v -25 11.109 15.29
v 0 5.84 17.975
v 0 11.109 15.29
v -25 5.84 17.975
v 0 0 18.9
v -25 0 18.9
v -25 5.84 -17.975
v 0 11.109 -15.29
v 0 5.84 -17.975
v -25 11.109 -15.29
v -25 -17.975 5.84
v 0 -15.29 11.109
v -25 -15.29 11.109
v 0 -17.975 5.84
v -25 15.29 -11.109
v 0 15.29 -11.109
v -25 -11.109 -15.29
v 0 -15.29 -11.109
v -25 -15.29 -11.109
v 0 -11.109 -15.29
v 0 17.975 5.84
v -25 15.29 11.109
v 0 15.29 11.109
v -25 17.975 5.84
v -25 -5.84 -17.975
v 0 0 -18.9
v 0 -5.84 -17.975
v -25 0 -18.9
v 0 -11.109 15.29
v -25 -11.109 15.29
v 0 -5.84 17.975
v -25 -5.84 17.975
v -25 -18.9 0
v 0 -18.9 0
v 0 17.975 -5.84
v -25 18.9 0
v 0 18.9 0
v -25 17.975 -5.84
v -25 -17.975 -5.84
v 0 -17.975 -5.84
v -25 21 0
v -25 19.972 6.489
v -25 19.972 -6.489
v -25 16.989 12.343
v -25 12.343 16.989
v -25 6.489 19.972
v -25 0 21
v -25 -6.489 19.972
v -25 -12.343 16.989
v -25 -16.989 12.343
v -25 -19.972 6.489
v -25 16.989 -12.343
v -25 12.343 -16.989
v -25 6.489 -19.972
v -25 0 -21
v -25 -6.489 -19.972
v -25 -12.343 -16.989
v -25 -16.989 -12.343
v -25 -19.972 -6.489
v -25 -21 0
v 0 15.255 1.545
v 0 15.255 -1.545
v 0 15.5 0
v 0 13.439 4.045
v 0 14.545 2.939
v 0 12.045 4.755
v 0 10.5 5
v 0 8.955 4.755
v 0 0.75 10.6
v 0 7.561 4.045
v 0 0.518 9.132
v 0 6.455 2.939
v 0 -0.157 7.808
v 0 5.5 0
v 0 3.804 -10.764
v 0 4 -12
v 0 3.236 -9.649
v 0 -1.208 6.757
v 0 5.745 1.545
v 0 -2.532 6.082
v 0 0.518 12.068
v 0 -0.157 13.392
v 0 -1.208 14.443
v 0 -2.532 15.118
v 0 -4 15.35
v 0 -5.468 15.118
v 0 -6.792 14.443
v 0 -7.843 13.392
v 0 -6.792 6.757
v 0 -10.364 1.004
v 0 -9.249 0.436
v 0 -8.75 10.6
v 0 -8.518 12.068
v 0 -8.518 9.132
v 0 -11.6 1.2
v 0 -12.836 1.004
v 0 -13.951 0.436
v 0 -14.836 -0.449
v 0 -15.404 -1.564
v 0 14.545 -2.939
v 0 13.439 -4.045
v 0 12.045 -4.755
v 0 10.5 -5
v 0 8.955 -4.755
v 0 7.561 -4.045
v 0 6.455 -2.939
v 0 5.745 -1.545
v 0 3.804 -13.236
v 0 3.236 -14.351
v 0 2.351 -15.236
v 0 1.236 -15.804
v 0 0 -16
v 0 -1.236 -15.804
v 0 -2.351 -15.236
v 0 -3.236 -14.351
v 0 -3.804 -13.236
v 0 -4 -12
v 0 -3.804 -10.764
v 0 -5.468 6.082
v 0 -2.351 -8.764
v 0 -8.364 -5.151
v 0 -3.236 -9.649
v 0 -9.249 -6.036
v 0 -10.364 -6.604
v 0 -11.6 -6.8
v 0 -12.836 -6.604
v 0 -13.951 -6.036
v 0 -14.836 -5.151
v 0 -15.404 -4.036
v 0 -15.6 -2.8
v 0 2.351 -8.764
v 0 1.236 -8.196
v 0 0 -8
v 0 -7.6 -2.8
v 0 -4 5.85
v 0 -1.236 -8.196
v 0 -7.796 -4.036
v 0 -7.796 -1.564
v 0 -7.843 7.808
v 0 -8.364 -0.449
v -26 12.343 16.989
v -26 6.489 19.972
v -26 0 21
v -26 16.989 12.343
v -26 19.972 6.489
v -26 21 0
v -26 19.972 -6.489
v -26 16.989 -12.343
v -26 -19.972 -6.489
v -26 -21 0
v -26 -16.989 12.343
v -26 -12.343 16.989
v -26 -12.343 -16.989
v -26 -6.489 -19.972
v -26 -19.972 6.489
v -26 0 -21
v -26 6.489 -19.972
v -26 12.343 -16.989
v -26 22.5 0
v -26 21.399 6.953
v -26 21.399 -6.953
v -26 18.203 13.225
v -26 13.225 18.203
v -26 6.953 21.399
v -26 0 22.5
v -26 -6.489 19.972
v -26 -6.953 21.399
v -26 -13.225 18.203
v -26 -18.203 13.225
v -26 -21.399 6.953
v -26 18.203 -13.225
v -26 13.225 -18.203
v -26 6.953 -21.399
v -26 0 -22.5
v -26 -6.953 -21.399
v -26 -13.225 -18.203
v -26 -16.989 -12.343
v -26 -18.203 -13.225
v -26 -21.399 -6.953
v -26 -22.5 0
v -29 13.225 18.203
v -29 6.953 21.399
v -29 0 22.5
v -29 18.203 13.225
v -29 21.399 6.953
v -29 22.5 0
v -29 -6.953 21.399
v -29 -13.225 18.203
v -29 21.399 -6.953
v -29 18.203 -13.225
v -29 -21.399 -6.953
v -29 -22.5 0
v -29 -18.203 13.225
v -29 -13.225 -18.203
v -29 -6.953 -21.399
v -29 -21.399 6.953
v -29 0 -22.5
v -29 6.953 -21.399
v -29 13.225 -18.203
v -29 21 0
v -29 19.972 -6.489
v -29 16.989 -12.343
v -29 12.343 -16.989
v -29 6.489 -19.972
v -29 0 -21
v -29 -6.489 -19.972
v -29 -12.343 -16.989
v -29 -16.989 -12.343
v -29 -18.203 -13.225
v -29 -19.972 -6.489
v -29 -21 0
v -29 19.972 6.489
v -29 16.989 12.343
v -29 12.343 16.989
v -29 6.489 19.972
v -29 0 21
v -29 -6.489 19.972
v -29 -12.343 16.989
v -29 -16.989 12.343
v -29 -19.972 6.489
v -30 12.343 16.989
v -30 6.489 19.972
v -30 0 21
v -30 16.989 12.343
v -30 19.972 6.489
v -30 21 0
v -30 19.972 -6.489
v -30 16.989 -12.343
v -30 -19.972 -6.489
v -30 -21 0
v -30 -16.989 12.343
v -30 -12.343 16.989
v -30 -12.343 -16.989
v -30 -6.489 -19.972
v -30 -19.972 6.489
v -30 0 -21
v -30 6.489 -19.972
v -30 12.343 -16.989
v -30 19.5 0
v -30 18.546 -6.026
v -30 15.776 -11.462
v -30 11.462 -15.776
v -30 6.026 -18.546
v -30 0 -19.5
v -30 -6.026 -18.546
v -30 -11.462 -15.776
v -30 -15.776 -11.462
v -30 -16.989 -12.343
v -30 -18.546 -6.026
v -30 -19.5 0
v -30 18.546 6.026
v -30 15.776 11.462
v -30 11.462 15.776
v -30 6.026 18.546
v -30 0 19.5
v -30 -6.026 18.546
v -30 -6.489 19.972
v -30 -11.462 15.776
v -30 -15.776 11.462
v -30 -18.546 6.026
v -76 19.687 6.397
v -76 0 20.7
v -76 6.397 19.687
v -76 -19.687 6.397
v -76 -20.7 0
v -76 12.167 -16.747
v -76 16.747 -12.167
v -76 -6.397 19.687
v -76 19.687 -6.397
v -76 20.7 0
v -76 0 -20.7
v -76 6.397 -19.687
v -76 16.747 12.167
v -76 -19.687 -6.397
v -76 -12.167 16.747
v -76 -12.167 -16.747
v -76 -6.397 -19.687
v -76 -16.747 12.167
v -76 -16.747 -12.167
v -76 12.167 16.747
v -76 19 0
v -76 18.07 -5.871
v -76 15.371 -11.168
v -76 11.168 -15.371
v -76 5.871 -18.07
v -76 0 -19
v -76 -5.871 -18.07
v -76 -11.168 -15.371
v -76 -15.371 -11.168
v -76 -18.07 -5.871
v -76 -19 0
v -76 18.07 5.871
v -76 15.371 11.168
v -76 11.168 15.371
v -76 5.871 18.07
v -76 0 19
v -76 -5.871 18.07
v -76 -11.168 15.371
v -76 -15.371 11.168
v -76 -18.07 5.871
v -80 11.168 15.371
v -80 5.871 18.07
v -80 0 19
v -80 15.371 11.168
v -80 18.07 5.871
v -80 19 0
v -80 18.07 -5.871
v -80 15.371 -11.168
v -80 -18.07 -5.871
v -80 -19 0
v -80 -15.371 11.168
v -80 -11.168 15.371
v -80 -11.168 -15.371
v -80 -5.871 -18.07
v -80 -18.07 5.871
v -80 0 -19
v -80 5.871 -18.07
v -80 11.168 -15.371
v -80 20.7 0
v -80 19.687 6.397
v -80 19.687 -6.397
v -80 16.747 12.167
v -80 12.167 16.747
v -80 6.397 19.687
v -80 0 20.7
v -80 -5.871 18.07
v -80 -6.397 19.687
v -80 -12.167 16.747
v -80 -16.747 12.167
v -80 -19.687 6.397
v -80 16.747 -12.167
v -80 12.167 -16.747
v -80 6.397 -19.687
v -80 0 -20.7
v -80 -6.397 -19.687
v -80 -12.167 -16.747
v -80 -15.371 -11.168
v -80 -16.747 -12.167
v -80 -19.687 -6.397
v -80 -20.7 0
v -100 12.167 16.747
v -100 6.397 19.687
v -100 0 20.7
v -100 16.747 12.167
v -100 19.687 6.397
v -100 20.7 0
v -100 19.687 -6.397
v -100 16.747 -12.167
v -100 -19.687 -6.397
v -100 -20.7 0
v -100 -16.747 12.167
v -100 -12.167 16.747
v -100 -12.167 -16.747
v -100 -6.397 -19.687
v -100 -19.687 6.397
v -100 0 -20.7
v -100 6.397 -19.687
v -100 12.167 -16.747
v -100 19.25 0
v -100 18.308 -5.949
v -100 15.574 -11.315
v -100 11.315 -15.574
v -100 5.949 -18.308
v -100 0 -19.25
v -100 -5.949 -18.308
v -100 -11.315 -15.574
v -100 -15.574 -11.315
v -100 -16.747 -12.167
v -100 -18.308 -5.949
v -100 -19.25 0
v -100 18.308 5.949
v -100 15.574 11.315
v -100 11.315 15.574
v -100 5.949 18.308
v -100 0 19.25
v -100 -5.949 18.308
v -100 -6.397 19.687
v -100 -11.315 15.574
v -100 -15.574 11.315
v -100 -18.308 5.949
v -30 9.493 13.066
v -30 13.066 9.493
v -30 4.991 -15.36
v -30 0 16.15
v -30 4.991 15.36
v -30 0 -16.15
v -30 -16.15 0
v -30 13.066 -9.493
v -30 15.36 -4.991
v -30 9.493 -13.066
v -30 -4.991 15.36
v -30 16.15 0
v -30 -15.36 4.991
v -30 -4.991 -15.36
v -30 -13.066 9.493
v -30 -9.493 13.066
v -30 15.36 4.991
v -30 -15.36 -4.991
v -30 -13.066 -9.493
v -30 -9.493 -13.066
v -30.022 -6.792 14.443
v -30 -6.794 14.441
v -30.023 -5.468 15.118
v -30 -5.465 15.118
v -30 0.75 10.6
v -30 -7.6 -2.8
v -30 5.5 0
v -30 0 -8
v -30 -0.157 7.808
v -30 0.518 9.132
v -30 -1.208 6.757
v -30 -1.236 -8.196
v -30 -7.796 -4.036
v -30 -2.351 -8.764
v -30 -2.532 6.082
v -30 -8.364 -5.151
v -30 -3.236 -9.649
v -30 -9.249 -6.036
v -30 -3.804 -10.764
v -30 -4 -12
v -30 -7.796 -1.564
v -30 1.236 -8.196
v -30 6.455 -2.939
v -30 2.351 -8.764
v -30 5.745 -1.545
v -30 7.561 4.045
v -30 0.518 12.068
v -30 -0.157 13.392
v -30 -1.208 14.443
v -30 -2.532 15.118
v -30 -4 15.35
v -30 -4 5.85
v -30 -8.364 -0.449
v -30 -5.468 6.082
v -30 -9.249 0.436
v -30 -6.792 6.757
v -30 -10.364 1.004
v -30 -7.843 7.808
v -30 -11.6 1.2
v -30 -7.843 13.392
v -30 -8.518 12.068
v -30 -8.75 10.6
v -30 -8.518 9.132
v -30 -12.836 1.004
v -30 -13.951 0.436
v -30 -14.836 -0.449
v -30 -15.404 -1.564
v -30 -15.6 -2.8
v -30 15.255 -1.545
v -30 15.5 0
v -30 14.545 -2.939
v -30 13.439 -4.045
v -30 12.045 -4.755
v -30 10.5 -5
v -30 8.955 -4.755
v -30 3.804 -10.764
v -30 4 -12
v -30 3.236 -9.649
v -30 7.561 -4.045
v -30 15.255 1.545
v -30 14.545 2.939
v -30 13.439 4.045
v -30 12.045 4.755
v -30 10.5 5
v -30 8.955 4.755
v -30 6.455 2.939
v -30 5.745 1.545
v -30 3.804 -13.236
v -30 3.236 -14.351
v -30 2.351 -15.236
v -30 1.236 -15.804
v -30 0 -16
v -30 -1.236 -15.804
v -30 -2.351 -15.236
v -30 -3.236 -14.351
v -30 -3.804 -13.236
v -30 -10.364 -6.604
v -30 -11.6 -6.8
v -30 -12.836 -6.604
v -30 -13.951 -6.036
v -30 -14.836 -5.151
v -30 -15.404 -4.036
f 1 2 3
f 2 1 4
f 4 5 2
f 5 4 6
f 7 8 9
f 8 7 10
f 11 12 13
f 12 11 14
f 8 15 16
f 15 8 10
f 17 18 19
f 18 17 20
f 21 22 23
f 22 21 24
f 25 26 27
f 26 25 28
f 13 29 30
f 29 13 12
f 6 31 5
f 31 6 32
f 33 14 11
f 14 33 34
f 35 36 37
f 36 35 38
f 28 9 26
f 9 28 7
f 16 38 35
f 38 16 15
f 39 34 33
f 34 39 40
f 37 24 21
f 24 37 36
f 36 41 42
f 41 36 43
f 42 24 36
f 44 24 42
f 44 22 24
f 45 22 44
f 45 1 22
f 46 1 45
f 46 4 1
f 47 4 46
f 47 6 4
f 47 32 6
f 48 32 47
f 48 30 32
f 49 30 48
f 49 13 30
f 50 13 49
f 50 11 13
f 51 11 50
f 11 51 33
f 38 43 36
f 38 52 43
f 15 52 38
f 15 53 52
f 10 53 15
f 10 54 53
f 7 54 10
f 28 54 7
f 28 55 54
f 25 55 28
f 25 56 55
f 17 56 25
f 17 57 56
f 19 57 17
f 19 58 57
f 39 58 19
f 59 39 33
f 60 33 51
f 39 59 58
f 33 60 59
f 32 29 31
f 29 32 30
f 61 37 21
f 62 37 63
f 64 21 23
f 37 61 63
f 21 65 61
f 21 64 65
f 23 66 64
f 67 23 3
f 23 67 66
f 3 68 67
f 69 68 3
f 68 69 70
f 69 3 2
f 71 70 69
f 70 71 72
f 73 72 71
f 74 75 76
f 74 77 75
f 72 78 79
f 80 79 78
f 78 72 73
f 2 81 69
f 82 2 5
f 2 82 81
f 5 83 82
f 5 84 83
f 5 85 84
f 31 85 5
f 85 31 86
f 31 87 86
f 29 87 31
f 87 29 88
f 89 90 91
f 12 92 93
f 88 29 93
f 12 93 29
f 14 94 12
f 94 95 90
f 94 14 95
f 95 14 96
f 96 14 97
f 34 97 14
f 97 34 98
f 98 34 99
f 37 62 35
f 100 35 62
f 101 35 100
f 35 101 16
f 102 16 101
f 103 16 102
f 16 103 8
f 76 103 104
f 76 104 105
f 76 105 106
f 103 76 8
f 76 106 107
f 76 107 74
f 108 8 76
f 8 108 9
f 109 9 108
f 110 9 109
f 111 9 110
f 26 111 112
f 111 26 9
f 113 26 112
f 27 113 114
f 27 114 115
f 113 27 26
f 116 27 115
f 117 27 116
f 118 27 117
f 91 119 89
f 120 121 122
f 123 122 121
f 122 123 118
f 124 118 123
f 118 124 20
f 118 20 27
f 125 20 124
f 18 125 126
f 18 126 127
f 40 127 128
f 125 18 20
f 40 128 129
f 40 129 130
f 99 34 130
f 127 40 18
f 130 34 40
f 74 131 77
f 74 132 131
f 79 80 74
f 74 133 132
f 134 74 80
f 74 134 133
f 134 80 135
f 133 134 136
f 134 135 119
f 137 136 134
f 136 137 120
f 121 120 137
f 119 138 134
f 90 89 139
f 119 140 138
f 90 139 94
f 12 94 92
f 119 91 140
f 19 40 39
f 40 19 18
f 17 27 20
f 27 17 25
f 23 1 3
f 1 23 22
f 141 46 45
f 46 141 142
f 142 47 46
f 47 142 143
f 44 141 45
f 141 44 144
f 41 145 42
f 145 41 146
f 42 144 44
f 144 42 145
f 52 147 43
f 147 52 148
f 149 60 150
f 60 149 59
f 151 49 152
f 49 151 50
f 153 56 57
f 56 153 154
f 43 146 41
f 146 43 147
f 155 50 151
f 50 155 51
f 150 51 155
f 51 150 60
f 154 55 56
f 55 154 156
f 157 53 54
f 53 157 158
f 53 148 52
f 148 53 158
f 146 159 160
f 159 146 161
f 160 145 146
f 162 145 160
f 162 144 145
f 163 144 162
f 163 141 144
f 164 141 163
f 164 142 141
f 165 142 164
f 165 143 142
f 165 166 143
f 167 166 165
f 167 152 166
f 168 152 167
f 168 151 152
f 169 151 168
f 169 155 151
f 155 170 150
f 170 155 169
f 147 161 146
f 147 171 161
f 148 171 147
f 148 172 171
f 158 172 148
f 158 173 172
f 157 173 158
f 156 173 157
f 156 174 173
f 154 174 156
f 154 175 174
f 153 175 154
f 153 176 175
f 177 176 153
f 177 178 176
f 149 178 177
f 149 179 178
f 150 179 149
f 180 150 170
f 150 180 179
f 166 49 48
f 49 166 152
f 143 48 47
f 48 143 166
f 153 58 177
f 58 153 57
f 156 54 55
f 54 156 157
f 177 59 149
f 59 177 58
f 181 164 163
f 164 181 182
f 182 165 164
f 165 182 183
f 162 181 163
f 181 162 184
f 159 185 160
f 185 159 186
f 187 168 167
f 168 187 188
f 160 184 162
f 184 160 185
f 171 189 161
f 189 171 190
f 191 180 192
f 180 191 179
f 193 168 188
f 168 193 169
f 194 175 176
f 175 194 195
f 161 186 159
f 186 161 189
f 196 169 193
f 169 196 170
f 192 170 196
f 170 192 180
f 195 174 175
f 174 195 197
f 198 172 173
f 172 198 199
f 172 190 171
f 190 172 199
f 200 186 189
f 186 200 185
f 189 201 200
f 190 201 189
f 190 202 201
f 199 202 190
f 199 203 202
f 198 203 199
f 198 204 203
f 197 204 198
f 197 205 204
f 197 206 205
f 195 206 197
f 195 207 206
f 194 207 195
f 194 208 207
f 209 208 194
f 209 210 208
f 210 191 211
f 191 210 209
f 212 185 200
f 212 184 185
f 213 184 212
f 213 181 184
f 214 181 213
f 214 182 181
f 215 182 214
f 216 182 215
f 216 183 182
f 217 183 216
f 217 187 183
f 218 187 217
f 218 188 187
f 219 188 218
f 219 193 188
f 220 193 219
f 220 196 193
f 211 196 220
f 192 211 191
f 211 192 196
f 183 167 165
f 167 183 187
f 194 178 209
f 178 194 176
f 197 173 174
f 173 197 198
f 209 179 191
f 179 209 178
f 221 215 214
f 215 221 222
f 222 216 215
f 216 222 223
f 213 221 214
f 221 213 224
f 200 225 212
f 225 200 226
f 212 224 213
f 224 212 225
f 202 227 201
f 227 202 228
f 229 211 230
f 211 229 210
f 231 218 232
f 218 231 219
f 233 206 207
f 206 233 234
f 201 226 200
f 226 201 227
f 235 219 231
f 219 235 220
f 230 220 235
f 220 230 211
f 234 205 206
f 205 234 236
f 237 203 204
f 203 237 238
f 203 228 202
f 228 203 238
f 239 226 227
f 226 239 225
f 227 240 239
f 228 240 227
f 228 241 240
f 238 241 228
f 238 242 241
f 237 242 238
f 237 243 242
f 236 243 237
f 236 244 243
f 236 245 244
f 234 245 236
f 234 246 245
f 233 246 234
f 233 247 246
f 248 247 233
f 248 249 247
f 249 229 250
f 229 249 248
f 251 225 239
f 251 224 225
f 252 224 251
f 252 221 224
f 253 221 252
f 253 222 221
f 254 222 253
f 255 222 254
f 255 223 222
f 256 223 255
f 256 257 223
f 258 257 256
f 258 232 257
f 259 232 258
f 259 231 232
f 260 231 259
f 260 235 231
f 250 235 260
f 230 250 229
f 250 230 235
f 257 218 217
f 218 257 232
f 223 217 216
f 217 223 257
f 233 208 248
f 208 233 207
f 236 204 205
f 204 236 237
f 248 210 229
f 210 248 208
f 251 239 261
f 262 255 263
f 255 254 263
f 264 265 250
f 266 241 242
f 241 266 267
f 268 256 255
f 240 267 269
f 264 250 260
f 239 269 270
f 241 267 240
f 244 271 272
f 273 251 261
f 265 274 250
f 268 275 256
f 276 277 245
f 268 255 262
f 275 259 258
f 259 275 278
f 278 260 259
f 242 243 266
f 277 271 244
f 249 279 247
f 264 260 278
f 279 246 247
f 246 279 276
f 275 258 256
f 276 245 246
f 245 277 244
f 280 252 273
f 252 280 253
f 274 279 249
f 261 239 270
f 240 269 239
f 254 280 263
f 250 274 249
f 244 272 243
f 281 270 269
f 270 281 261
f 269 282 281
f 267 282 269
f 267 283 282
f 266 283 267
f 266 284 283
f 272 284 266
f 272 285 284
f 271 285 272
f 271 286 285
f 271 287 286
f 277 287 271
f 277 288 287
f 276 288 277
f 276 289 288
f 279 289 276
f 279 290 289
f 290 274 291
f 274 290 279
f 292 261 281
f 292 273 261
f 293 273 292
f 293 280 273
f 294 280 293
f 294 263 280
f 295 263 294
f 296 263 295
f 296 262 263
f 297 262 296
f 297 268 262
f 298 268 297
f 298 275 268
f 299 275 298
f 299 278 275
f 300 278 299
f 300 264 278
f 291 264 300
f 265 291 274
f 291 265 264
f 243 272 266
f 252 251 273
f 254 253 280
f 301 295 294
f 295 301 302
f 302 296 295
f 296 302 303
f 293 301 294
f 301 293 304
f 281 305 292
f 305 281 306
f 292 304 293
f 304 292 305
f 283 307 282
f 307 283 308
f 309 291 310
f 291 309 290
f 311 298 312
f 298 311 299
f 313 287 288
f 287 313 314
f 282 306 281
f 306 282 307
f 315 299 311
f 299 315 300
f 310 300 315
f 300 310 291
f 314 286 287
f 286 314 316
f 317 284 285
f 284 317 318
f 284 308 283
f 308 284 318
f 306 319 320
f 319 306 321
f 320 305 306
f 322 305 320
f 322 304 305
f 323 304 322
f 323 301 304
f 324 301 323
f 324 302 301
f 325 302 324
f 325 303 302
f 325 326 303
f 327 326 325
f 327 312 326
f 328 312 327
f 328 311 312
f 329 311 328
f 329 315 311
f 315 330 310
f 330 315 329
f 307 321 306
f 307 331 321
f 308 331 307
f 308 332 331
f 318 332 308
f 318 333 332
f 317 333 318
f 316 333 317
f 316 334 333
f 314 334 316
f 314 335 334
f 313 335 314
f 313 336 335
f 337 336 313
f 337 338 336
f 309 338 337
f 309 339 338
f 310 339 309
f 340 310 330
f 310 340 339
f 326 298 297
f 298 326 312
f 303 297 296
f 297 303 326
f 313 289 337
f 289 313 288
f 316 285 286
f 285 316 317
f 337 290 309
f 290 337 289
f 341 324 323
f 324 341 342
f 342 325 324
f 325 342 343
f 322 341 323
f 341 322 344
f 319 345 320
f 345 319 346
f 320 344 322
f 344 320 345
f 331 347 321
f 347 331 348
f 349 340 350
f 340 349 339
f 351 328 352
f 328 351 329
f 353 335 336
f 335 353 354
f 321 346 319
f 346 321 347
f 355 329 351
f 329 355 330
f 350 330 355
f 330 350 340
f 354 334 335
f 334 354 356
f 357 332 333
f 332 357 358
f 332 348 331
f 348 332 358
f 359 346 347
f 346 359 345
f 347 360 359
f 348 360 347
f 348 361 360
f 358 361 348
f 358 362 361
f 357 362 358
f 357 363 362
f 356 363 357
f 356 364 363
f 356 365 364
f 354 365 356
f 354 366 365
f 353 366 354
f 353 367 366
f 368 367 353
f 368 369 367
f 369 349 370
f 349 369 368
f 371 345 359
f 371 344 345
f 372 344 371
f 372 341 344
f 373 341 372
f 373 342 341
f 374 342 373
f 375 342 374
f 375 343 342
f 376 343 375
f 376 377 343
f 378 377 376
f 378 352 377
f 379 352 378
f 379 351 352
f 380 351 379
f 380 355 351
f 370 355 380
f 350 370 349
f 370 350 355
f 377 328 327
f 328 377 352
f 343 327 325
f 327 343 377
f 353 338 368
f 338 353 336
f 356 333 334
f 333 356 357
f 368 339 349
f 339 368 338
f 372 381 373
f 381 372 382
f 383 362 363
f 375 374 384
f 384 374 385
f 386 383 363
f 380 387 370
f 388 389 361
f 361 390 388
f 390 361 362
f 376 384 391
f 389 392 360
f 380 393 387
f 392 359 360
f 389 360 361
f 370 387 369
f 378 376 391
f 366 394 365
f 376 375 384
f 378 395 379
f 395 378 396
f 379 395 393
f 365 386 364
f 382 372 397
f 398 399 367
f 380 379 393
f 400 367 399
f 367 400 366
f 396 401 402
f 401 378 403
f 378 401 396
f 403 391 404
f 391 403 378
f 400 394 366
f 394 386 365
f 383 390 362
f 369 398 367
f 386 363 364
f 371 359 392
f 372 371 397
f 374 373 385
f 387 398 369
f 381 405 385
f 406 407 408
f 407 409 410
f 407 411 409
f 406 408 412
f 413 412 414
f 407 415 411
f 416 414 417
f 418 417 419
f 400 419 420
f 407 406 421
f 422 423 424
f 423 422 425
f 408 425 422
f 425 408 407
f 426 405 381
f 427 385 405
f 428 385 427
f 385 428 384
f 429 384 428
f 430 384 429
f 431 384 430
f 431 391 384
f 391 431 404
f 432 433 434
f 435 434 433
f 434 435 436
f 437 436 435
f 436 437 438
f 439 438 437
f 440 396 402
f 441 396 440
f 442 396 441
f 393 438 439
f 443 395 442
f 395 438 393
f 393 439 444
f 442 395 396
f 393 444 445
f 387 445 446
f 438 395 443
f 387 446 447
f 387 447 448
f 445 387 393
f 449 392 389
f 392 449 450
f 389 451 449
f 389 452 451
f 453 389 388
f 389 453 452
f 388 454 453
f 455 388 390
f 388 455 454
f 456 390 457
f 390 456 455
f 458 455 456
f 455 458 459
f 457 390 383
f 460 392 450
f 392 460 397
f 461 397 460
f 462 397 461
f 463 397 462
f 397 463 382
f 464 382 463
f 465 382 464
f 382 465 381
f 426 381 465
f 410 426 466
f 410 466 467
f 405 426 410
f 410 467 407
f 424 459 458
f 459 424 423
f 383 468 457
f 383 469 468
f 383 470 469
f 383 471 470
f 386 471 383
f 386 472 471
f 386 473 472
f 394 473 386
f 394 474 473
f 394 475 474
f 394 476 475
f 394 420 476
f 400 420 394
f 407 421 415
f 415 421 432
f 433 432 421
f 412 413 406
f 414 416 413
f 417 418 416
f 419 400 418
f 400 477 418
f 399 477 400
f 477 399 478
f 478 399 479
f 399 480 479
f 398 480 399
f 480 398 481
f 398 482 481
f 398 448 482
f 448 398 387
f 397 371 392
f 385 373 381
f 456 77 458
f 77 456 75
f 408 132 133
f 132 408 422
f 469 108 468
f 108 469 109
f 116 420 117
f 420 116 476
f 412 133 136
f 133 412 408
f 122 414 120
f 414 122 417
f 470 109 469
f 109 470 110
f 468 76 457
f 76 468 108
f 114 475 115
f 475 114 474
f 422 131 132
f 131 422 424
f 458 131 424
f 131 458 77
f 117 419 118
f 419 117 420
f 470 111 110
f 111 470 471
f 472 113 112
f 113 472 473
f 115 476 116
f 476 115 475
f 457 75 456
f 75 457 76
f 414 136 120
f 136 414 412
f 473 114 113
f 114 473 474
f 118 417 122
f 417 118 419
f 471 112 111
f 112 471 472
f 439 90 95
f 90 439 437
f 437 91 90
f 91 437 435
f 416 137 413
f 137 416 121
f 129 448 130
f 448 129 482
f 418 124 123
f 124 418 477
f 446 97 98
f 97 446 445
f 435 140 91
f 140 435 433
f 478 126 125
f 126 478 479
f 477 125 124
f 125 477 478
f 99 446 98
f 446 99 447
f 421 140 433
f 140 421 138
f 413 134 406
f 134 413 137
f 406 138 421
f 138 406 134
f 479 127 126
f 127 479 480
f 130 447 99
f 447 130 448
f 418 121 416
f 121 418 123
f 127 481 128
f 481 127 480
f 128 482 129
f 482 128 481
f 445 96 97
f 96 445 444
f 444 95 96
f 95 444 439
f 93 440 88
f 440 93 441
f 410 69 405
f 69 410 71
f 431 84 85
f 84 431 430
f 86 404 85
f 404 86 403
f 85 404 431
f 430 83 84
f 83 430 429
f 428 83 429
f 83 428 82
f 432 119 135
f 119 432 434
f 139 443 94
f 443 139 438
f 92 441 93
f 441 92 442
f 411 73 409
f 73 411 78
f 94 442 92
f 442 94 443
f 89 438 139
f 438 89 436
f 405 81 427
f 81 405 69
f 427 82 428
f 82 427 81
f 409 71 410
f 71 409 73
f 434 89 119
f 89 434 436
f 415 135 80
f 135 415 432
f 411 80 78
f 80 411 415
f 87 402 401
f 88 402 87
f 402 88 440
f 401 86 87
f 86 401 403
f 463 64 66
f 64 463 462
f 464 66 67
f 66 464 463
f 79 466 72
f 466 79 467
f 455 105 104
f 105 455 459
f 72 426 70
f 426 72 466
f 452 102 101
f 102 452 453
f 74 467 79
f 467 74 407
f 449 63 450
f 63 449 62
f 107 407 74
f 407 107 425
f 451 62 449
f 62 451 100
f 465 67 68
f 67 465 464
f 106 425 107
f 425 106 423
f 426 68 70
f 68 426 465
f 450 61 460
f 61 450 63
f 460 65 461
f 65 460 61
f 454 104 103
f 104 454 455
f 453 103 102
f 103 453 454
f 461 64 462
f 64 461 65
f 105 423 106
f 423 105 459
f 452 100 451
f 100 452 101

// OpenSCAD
// openNSP_project, common stock version 1.0
// Zexuan Qiao, 2024
// under GPL license ver3

mainStockLOA = 100; //.1

ferruleWood = 25; //.1
ferruleWoodDiameter = 37.8; //.1

decoration1 = 1; //.1
decoration2 = 3; //.1
decoration3 = 1; //.1
decoration1Diameter = 42; //.1
decoration2Diameter = 45; //.1
decoration3Diameter = 42; //.1

main = 46; //.1
mainDiameter1 = 39; //.1
mainDiameter2 = 41.4; //.1

groove = 4; //.1
grooveDiameter = 38; //.1

bagEnd = 20; //.1

inside = 70; //.1
insideDiameter1 = 32.3; //.1
insideDiameter2 = 38.5; //.1

smallGBore = 8; //.1
smallG_X = -12; //.1
smallG_Y = 0; //.1
smallDBore = 8; //.1
smallD_X = -2.8; //.1
smallD_Y = 11.6; //.1
bigGBore = 9.5; //.1
bigG_X = 10.6; //.1
bigG_Y = 4; //.1
bigDBore = 10; //.1
bigD_X = 0; //.1
bigD_Y = -10.5; //.1


/* [Utilities] */
// Segments, the higher the value, the smoother the surface would be.
$fn = 20;

rotate([0,-90,0]) difference(){
union(){
cylinder(h = ferruleWood, d = ferruleWoodDiameter);
translate([0,0,ferruleWood]) cylinder(h = decoration1, d = decoration1Diameter);
translate([0,0,ferruleWood+decoration1]) cylinder(h = decoration2, d = decoration2Diameter);
translate([0,0,ferruleWood+decoration1+decoration2])cylinder(h = decoration3, d = decoration3Diameter);
translate([0,0,ferruleWood+decoration1+decoration2+decoration3]) cylinder(h = main, d1 = mainDiameter1, d2 = mainDiameter2);
translate([0,0,ferruleWood+decoration1+decoration2+decoration3+main]) cylinder(h = groove, d = grooveDiameter);
translate([0,0,ferruleWood+decoration1+decoration2+decoration3+main]) cylinder(h = groove, d = grooveDiameter);
translate([0,0,ferruleWood+decoration1+decoration2+decoration3+main+groove]) cylinder(h = bagEnd, d = mainDiameter2);
}
translate([0,0, mainStockLOA - inside]) cylinder(h = inside, d1 = insideDiameter1, d2 = insideDiameter2);
translate([smallG_X,-smallG_Y, 0]) cylinder(h = mainStockLOA, d = smallGBore);
translate([smallD_X, -smallD_Y,0]) cylinder(h = mainStockLOA, d = smallDBore);
translate([bigG_X, -bigG_Y,0]) cylinder(h = mainStockLOA, d = bigGBore);
translate([bigD_X, -bigD_Y, 0]) cylinder(h = mainStockLOA, d = bigDBore);
}
